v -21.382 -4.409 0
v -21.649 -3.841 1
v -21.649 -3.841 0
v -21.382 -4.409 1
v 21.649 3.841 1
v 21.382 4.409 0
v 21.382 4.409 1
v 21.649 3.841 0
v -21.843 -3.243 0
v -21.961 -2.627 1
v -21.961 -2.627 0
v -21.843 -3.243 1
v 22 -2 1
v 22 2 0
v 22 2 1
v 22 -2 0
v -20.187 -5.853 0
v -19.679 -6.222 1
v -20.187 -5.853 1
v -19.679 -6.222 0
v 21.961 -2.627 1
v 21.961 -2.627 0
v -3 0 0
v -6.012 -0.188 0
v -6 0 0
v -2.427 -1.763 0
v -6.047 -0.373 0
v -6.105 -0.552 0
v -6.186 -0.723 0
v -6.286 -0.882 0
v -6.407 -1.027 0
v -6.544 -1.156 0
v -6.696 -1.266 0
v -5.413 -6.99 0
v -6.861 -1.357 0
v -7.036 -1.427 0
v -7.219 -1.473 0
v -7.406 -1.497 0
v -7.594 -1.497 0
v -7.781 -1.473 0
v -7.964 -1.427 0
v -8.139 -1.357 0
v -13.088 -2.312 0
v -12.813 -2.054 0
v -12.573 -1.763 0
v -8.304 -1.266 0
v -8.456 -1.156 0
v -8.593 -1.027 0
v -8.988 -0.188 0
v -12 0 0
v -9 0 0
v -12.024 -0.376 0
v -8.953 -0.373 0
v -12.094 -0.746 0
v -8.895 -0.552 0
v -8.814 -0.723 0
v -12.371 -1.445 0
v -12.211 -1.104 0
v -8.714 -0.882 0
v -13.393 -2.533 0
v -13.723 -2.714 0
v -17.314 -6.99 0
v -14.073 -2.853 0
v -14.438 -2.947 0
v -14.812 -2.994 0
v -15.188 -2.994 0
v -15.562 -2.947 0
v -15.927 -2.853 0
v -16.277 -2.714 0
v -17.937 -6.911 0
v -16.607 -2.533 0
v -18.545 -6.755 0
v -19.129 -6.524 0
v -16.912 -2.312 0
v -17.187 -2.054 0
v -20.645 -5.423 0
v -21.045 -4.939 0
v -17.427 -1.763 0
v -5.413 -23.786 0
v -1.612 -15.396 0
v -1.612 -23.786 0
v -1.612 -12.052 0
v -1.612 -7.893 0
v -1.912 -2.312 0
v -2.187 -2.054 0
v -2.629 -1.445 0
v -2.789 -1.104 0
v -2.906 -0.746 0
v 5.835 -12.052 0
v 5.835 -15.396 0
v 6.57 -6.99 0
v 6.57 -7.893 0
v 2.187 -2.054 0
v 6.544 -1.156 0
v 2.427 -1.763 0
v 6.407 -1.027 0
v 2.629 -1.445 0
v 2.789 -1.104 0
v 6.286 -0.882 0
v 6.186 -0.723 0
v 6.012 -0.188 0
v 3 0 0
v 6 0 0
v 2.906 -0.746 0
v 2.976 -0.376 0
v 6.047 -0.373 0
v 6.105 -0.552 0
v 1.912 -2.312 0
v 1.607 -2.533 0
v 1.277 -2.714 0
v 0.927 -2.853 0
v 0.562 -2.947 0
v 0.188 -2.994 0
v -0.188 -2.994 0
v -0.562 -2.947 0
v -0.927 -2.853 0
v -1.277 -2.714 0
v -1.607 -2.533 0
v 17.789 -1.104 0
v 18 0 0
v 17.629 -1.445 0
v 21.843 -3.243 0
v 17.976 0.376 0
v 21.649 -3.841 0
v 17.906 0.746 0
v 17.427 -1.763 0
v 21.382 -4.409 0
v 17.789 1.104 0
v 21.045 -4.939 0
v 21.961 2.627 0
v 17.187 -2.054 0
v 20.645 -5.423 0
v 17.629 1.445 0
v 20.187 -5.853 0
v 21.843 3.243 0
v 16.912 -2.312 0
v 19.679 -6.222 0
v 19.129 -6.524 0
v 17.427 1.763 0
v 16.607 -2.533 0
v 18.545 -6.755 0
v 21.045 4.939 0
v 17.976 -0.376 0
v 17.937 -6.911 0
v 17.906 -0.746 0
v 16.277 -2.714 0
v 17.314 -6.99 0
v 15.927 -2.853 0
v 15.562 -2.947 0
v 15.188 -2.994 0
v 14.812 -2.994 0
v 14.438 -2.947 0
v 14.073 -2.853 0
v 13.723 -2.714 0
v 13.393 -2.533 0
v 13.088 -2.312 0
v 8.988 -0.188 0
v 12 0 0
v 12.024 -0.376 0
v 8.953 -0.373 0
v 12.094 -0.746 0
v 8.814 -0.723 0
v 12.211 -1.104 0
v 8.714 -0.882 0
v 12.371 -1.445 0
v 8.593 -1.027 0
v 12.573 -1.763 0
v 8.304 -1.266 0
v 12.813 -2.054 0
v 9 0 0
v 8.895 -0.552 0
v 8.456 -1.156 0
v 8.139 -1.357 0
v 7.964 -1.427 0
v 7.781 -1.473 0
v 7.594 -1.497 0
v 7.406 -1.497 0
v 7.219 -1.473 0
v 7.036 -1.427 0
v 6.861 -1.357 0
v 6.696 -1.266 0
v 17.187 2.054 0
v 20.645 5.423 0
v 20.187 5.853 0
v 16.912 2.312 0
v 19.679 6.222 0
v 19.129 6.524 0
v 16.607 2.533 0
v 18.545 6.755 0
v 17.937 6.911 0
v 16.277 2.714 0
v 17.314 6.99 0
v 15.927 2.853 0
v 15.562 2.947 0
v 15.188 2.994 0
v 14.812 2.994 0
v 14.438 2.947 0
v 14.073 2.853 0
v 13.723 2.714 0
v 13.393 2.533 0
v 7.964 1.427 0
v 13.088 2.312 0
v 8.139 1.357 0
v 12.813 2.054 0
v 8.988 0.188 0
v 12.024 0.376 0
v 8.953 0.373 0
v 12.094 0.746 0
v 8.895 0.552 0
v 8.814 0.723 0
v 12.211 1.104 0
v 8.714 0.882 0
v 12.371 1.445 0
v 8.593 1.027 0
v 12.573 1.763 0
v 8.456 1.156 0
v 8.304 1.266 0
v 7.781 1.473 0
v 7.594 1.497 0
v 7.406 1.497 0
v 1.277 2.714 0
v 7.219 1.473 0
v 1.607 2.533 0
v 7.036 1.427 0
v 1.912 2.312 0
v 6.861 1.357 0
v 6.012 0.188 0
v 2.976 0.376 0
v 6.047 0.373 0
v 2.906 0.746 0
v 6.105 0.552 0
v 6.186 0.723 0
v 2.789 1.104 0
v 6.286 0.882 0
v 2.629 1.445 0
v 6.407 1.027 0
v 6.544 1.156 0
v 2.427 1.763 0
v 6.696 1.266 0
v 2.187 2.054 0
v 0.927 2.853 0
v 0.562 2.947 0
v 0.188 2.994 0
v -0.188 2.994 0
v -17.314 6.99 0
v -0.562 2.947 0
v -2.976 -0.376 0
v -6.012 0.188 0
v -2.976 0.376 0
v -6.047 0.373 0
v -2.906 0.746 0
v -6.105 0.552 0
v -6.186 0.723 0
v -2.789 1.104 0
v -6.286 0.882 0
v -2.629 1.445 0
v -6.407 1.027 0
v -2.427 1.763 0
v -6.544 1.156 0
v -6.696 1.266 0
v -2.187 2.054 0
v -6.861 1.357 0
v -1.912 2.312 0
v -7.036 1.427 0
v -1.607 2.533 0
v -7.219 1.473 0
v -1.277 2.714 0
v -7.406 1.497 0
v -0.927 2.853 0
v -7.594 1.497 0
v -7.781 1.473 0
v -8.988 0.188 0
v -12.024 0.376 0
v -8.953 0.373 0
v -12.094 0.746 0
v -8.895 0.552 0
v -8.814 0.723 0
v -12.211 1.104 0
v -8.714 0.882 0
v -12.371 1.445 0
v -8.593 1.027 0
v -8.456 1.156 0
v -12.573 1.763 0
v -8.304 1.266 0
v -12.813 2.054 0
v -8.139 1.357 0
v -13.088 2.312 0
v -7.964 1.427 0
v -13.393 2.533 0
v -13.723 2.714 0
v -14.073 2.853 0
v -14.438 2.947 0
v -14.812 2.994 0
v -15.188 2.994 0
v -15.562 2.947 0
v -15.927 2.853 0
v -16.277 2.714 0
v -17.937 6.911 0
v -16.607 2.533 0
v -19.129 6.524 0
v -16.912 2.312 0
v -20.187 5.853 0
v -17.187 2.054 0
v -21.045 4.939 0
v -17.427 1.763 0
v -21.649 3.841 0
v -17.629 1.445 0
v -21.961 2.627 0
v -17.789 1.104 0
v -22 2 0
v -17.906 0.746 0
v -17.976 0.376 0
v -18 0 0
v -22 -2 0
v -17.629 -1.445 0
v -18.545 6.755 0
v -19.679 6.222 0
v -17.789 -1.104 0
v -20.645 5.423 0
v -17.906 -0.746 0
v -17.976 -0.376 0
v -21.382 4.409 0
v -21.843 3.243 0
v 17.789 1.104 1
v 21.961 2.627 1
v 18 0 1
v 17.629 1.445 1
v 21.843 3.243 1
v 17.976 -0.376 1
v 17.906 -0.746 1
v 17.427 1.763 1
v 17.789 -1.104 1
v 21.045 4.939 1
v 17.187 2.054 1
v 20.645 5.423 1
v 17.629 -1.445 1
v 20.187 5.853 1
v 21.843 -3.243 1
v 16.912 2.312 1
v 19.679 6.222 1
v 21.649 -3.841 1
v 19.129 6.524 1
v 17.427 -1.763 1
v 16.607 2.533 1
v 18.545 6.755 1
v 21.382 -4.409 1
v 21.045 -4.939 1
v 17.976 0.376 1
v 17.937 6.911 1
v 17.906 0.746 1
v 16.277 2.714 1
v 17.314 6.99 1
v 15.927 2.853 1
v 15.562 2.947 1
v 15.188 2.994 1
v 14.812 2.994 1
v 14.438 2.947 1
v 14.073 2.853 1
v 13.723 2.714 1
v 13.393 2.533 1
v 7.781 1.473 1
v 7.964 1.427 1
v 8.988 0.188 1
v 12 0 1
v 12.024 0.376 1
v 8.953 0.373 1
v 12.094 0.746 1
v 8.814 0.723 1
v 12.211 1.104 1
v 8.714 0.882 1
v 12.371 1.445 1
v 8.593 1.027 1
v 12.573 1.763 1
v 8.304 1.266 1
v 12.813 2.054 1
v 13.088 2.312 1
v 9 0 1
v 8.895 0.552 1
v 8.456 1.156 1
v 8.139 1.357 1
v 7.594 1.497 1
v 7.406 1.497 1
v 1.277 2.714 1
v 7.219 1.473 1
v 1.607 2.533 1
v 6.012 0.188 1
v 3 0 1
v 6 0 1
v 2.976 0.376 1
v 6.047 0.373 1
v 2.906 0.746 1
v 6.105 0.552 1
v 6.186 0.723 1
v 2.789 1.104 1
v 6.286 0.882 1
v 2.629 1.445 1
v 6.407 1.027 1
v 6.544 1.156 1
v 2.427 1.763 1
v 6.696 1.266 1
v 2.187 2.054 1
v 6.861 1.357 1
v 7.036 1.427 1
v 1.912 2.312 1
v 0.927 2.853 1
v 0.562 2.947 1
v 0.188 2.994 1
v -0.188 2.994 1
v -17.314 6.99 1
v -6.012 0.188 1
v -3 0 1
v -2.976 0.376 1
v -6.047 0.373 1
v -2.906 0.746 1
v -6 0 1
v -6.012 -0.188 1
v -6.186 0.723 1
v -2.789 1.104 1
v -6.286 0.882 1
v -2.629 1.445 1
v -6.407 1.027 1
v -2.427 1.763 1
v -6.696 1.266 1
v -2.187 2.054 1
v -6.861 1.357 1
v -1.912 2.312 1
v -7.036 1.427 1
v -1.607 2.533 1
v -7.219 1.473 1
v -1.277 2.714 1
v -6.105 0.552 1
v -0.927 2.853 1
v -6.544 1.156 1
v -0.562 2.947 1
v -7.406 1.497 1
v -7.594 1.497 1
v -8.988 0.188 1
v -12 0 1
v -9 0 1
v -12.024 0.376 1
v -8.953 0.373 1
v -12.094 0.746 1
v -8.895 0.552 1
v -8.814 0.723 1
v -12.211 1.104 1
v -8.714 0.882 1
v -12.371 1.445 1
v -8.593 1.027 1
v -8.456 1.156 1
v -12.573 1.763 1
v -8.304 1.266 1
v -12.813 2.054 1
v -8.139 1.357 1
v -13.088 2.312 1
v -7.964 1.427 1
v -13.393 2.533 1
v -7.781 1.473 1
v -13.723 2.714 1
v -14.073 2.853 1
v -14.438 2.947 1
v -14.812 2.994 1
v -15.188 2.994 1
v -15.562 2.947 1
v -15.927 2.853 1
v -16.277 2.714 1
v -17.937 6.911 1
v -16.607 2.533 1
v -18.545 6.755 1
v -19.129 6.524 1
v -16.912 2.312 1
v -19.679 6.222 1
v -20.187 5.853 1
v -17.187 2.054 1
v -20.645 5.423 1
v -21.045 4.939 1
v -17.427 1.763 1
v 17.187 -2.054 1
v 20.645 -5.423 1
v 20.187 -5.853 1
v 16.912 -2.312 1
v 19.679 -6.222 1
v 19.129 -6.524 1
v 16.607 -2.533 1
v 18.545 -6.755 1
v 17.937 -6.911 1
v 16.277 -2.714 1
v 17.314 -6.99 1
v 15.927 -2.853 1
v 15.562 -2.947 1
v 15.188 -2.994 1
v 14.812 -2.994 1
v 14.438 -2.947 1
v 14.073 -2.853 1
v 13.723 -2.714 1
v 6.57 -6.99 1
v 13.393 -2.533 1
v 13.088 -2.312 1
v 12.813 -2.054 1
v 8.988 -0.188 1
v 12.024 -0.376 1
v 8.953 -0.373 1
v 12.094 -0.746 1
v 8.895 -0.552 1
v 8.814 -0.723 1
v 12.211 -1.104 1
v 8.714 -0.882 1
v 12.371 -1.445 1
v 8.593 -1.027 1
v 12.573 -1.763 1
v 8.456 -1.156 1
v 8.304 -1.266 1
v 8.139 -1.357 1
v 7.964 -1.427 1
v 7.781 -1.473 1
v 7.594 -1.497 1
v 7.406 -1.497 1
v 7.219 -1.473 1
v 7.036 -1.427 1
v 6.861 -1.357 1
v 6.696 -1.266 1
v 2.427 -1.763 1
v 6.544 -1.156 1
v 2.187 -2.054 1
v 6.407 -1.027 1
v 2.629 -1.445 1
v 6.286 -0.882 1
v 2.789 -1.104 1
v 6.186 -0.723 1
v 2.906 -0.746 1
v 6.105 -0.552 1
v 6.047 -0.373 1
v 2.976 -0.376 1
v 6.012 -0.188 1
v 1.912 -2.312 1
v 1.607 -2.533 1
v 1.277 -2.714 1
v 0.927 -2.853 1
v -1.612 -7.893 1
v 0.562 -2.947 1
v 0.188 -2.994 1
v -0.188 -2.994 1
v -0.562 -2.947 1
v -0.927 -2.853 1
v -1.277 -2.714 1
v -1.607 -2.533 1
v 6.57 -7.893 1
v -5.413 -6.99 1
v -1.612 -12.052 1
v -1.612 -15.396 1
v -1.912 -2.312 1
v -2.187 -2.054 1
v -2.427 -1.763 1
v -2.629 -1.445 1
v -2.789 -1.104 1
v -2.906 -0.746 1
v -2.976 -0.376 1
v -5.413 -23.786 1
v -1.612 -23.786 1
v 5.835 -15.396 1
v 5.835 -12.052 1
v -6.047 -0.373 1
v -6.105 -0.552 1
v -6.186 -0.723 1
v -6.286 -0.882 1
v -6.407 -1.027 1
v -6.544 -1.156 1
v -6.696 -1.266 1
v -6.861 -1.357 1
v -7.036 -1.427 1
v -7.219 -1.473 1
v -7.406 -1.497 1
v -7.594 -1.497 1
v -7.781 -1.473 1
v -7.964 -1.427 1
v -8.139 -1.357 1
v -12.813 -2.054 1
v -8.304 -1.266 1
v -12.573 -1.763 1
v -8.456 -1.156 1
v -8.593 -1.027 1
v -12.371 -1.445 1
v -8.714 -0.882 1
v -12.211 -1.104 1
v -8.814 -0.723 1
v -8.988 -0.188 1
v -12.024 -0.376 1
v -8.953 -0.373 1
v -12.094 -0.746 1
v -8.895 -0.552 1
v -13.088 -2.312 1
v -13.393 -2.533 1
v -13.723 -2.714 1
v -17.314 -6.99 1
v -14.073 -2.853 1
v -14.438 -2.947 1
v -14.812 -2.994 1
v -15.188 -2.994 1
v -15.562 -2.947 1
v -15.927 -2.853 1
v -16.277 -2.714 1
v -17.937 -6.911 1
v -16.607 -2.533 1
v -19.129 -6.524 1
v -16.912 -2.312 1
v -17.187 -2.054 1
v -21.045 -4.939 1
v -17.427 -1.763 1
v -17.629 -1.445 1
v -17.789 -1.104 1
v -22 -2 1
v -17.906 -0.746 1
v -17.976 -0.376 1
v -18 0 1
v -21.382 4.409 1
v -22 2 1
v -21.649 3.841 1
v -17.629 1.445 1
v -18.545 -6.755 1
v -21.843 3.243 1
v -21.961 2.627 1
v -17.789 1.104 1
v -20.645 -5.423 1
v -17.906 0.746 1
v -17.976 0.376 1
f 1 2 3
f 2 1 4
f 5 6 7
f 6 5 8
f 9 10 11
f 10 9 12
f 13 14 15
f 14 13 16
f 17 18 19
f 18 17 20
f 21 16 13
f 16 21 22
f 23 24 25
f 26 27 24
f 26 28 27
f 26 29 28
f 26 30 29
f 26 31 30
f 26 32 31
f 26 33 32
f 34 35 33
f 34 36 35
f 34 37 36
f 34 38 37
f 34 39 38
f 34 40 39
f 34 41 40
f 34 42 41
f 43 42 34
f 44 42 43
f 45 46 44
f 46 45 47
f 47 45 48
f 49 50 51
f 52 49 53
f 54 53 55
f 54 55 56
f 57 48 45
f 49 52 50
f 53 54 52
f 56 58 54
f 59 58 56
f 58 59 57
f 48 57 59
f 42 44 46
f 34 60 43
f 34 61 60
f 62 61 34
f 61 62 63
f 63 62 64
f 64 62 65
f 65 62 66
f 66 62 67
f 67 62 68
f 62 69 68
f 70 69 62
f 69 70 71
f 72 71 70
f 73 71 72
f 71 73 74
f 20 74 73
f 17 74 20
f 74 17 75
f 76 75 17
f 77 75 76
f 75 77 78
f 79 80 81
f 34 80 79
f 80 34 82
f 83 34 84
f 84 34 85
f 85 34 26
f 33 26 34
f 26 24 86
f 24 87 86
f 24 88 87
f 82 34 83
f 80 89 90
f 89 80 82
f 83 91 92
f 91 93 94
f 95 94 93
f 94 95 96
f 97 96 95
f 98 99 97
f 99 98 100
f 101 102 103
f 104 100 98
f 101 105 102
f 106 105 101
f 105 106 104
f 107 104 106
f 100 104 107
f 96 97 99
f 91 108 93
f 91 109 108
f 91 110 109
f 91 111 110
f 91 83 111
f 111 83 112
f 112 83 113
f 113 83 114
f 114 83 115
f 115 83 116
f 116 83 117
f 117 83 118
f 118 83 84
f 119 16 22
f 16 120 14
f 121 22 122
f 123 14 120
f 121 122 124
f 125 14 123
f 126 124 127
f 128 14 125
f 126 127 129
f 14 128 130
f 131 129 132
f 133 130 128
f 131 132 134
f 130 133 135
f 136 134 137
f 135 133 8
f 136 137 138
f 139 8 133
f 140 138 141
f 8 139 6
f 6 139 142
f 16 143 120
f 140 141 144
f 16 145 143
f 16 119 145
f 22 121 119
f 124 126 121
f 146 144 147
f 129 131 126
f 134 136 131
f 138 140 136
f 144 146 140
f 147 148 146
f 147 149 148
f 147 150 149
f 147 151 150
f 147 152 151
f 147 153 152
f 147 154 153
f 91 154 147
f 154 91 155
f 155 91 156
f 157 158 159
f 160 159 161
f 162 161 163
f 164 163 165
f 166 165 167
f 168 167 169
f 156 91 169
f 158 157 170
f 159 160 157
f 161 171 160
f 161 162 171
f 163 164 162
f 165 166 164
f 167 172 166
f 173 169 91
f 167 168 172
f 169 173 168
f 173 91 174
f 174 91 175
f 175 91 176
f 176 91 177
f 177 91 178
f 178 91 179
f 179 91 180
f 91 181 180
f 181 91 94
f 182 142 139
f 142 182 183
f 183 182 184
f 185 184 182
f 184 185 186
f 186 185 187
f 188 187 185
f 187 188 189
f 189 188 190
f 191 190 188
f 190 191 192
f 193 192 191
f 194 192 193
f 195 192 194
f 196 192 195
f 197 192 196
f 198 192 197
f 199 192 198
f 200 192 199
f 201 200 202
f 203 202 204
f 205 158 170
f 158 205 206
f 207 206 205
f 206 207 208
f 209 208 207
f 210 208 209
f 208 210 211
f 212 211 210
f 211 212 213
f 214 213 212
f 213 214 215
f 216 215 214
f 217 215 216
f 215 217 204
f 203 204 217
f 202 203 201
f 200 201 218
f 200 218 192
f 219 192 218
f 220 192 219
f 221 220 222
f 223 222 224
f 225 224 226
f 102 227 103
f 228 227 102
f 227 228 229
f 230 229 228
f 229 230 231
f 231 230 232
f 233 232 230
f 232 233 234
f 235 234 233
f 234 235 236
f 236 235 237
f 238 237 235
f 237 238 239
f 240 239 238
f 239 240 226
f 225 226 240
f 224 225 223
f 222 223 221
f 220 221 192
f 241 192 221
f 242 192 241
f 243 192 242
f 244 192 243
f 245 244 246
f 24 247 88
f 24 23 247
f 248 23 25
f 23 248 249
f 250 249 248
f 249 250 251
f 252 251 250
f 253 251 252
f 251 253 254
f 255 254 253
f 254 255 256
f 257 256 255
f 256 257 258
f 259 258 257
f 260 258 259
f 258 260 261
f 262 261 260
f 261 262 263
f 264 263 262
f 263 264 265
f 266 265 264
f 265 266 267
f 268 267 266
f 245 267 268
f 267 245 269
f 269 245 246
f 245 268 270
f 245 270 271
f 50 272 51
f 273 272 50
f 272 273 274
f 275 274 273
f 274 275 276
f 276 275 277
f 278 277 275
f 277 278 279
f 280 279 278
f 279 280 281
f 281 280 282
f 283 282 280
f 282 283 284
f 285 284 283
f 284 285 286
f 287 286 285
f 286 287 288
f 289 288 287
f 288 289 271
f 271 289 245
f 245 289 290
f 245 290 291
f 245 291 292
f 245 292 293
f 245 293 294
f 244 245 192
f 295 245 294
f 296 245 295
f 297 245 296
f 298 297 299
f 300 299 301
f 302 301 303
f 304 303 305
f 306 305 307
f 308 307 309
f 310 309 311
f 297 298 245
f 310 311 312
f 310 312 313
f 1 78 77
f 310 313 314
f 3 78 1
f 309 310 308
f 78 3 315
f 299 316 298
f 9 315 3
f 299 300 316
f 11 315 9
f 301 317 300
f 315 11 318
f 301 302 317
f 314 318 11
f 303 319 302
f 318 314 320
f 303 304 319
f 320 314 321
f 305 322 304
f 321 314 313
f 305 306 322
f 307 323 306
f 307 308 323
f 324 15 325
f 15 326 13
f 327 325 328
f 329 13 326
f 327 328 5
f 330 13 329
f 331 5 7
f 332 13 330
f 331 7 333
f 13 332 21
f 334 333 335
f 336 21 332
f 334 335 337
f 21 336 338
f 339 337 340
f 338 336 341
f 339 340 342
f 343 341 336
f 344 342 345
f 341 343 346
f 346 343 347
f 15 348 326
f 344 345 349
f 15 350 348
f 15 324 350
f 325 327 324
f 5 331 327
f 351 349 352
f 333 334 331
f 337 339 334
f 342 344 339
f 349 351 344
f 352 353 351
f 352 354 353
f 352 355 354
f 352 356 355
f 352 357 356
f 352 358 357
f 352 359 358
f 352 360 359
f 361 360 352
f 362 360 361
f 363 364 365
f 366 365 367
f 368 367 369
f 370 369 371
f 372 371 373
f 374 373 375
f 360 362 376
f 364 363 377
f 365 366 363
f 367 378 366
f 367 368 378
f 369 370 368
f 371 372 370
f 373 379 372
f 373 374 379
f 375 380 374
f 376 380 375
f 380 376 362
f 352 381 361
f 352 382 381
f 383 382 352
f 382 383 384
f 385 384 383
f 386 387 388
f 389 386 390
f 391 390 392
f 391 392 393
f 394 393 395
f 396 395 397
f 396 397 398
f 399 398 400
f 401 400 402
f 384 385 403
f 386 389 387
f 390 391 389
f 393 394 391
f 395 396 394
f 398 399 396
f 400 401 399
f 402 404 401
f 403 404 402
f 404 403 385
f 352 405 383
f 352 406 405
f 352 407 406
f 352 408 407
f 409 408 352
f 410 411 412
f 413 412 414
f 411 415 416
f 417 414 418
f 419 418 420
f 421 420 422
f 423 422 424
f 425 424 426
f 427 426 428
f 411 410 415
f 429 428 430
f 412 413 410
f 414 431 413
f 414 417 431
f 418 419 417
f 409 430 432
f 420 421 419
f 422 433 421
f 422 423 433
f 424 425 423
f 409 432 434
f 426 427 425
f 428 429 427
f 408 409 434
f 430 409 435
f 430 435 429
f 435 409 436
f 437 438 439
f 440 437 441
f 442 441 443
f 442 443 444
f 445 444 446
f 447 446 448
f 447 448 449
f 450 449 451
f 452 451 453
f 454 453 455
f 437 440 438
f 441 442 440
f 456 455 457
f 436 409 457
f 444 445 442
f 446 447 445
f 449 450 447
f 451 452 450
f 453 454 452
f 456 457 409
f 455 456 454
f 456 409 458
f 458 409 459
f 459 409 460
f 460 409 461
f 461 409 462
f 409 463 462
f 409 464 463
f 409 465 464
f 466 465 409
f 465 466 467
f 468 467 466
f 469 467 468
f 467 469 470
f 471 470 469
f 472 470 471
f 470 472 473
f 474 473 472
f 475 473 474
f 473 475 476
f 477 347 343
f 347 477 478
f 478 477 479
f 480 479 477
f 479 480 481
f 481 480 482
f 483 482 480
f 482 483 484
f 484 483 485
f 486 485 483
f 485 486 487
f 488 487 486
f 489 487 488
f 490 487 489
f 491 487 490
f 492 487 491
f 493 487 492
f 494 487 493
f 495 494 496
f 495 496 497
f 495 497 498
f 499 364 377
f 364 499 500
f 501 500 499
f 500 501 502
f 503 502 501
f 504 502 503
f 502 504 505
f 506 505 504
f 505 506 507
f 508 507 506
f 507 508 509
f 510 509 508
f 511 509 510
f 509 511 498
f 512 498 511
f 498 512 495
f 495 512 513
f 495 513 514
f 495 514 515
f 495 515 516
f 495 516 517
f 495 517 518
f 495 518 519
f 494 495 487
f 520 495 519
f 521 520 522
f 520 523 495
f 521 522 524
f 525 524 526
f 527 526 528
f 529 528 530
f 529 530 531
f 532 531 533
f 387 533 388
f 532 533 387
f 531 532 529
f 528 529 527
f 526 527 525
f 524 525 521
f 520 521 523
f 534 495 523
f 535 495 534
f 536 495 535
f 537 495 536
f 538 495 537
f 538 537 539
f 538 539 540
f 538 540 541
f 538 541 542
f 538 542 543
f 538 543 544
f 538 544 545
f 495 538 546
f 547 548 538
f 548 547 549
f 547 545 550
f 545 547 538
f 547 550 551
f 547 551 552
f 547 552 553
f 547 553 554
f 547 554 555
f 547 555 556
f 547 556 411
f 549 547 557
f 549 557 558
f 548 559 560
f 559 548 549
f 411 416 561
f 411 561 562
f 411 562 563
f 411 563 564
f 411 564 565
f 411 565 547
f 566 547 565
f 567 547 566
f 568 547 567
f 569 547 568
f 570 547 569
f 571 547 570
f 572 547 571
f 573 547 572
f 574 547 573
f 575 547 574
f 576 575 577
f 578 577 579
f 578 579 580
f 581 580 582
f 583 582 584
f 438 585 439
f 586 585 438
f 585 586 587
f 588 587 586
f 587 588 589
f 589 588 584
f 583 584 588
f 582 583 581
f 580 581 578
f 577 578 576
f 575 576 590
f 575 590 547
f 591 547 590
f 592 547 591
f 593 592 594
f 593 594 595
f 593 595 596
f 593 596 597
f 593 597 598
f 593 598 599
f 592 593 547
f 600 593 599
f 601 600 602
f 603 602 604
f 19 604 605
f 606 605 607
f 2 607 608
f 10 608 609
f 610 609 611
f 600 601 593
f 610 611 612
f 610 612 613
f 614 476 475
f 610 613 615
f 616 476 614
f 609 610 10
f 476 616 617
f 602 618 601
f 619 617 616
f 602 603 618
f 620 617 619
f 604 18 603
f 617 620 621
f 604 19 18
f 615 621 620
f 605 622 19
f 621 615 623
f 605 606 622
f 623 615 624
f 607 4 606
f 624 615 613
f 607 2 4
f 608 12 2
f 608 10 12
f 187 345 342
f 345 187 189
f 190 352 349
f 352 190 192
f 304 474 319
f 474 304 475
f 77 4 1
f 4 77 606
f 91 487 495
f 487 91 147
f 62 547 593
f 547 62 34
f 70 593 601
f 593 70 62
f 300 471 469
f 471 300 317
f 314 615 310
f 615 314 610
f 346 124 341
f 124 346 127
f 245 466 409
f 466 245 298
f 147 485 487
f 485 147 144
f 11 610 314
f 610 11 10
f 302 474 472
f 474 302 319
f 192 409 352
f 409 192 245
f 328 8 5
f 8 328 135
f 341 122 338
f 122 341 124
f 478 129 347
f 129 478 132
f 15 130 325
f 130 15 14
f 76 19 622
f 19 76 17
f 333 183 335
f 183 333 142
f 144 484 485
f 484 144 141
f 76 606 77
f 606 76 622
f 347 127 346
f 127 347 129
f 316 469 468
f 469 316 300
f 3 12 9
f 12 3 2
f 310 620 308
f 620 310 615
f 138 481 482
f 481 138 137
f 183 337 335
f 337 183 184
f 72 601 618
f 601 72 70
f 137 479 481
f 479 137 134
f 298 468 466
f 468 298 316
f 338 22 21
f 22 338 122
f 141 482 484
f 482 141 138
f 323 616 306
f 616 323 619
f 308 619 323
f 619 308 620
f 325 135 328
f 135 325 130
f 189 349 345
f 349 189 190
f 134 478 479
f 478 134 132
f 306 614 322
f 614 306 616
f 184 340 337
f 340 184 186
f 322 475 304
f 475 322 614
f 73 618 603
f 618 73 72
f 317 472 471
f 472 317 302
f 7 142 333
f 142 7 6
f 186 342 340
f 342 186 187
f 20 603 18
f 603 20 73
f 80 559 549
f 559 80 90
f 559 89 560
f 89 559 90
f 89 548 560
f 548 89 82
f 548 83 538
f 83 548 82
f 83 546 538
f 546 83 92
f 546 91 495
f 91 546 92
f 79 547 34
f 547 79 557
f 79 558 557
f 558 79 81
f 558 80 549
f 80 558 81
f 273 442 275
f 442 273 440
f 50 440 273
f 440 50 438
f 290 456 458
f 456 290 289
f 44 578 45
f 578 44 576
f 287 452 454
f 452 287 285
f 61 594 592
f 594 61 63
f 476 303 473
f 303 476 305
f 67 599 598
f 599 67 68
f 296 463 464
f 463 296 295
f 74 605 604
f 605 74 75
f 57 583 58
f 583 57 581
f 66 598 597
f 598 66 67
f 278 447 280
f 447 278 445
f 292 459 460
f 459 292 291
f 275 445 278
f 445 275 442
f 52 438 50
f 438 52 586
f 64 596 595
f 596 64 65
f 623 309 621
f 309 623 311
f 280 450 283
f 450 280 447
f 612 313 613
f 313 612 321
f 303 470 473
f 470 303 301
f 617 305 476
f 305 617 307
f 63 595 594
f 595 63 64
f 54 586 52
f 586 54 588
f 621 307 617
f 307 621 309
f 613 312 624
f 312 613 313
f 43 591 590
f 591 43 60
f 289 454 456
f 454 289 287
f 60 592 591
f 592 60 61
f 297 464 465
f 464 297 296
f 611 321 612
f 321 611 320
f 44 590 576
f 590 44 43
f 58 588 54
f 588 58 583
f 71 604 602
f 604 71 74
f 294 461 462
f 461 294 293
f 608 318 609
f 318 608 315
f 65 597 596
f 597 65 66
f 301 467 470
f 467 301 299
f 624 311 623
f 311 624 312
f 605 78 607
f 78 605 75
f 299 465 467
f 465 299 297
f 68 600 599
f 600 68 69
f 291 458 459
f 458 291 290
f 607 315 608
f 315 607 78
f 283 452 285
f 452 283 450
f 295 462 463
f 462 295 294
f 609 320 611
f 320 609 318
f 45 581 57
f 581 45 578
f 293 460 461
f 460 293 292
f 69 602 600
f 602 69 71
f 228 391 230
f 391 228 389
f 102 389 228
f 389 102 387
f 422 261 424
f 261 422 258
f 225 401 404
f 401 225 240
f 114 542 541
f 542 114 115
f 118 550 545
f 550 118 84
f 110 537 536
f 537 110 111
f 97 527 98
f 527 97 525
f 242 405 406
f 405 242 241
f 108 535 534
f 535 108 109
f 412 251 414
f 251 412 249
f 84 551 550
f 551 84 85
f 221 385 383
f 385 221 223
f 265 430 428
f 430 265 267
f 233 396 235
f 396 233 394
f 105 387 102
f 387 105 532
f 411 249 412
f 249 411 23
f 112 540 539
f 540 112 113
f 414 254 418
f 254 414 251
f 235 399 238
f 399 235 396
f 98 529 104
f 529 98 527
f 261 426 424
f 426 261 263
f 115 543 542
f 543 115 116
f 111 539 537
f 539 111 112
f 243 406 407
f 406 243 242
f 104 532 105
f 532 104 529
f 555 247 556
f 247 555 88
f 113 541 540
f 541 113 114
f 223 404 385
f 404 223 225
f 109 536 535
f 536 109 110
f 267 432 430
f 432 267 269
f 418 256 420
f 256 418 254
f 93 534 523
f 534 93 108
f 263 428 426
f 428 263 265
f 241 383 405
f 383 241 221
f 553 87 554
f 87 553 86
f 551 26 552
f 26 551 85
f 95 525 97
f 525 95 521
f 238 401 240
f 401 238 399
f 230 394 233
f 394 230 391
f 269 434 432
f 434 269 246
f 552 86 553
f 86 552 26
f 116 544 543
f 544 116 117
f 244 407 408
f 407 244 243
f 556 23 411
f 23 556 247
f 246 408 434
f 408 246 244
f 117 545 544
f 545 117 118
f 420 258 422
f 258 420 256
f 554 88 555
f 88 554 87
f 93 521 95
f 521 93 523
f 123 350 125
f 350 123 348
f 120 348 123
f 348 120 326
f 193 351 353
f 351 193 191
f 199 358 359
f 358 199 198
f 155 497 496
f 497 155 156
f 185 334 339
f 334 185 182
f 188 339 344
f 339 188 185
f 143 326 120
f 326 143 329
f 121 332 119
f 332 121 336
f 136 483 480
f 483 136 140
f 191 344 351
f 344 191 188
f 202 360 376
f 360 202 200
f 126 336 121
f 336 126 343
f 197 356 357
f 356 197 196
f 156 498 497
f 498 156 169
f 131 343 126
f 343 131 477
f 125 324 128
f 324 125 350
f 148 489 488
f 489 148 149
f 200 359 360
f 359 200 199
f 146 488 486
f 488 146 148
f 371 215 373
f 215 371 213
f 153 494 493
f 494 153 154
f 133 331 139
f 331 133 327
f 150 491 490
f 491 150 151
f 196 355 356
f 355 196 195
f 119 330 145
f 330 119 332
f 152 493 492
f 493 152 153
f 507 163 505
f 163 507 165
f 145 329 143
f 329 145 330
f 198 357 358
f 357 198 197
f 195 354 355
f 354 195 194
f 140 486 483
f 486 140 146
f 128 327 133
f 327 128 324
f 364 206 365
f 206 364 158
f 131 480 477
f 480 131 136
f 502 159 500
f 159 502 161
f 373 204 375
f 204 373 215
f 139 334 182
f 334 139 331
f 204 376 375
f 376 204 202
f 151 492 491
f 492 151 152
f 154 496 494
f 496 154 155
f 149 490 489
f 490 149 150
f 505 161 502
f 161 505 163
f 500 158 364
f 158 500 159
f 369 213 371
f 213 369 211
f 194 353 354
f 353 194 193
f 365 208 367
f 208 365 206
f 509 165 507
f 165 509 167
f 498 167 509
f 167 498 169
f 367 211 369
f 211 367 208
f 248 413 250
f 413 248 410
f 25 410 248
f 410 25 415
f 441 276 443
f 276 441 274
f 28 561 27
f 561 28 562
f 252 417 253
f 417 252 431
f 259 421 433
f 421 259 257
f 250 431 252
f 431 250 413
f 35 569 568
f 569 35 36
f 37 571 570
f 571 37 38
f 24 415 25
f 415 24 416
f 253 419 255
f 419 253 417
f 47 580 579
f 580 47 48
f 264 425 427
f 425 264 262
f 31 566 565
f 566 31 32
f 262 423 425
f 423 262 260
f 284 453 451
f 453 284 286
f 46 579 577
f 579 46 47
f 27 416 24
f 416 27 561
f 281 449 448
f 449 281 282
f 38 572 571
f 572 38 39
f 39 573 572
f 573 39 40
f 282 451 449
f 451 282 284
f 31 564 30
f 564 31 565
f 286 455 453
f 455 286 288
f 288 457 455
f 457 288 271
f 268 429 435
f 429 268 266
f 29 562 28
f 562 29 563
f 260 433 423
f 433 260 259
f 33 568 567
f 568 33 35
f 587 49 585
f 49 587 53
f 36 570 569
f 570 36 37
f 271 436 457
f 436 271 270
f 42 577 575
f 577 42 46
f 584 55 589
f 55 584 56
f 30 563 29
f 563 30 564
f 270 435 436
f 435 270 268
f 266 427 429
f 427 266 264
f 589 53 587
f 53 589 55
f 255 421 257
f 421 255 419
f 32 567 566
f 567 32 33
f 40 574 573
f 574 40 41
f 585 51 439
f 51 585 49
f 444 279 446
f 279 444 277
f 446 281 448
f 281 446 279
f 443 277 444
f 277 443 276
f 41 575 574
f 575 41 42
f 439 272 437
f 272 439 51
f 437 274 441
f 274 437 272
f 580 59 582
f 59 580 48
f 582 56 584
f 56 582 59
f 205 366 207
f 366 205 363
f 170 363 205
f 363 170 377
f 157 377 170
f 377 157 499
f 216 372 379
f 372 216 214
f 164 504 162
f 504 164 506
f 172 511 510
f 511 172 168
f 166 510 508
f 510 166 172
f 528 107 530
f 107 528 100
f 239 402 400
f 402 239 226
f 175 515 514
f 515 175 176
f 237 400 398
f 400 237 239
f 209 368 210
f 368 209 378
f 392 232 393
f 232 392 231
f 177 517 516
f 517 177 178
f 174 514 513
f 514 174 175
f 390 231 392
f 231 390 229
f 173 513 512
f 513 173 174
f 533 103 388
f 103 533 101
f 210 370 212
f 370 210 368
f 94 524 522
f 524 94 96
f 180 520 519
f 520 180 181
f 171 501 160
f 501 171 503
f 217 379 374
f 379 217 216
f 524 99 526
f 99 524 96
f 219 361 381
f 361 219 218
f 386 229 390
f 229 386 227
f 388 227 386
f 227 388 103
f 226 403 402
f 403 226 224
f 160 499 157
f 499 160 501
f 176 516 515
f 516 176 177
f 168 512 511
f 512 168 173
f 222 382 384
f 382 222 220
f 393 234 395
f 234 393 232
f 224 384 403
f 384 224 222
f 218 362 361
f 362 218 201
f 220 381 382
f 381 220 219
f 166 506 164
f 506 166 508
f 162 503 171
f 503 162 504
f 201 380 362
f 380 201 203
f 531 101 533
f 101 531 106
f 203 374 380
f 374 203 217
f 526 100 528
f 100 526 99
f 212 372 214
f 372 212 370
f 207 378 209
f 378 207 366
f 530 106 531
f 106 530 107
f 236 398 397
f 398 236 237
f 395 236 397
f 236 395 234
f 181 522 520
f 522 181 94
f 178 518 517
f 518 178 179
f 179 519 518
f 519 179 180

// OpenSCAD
$fn = 50;


difference() {
	union() {
		hull() {
			translate(v = [-17.0000000000, 2.0000000000, 0]) {
				cylinder(h = 1, r = 5);
			}
			translate(v = [17.0000000000, 2.0000000000, 0]) {
				cylinder(h = 1, r = 5);
			}
			translate(v = [-17.0000000000, -2.0000000000, 0]) {
				cylinder(h = 1, r = 5);
			}
			translate(v = [17.0000000000, -2.0000000000, 0]) {
				cylinder(h = 1, r = 5);
			}
		}
		translate(v = [0, -5, 0]) {
			linear_extrude(height = 1) {
				text(font = "DejaVu Sans Mono:style=Bold", halign = "center", size = 19.0000000000, text = "F", valign = "top");
			}
		}
	}
	union() {
		translate(v = [-15.0000000000, 0.0000000000, 0]) {
			translate(v = [0, 0, -100]) {
				cylinder(h = 200, r = 3.0000000000);
			}
		}
		translate(v = [0, 0, -100]) {
			cylinder(h = 200, r = 3.0000000000);
		}
		translate(v = [15.0000000000, 0.0000000000, 0]) {
			translate(v = [0, 0, -100]) {
				cylinder(h = 200, r = 3.0000000000);
			}
		}
		translate(v = [-15.0000000000, 0.0000000000, 0]) {
			translate(v = [0, 0, -100]) {
				cylinder(h = 200, r = 1.5000000000);
			}
		}
		translate(v = [-7.5000000000, 0.0000000000, 0]) {
			translate(v = [0, 0, -100]) {
				cylinder(h = 200, r = 1.5000000000);
			}
		}
		translate(v = [0, 0, -100]) {
			cylinder(h = 200, r = 1.5000000000);
		}
		translate(v = [7.5000000000, 0.0000000000, 0]) {
			translate(v = [0, 0, -100]) {
				cylinder(h = 200, r = 1.5000000000);
			}
		}
		translate(v = [15.0000000000, 0.0000000000, 0]) {
			translate(v = [0, 0, -100]) {
				cylinder(h = 200, r = 1.5000000000);
			}
		}
	}
}
